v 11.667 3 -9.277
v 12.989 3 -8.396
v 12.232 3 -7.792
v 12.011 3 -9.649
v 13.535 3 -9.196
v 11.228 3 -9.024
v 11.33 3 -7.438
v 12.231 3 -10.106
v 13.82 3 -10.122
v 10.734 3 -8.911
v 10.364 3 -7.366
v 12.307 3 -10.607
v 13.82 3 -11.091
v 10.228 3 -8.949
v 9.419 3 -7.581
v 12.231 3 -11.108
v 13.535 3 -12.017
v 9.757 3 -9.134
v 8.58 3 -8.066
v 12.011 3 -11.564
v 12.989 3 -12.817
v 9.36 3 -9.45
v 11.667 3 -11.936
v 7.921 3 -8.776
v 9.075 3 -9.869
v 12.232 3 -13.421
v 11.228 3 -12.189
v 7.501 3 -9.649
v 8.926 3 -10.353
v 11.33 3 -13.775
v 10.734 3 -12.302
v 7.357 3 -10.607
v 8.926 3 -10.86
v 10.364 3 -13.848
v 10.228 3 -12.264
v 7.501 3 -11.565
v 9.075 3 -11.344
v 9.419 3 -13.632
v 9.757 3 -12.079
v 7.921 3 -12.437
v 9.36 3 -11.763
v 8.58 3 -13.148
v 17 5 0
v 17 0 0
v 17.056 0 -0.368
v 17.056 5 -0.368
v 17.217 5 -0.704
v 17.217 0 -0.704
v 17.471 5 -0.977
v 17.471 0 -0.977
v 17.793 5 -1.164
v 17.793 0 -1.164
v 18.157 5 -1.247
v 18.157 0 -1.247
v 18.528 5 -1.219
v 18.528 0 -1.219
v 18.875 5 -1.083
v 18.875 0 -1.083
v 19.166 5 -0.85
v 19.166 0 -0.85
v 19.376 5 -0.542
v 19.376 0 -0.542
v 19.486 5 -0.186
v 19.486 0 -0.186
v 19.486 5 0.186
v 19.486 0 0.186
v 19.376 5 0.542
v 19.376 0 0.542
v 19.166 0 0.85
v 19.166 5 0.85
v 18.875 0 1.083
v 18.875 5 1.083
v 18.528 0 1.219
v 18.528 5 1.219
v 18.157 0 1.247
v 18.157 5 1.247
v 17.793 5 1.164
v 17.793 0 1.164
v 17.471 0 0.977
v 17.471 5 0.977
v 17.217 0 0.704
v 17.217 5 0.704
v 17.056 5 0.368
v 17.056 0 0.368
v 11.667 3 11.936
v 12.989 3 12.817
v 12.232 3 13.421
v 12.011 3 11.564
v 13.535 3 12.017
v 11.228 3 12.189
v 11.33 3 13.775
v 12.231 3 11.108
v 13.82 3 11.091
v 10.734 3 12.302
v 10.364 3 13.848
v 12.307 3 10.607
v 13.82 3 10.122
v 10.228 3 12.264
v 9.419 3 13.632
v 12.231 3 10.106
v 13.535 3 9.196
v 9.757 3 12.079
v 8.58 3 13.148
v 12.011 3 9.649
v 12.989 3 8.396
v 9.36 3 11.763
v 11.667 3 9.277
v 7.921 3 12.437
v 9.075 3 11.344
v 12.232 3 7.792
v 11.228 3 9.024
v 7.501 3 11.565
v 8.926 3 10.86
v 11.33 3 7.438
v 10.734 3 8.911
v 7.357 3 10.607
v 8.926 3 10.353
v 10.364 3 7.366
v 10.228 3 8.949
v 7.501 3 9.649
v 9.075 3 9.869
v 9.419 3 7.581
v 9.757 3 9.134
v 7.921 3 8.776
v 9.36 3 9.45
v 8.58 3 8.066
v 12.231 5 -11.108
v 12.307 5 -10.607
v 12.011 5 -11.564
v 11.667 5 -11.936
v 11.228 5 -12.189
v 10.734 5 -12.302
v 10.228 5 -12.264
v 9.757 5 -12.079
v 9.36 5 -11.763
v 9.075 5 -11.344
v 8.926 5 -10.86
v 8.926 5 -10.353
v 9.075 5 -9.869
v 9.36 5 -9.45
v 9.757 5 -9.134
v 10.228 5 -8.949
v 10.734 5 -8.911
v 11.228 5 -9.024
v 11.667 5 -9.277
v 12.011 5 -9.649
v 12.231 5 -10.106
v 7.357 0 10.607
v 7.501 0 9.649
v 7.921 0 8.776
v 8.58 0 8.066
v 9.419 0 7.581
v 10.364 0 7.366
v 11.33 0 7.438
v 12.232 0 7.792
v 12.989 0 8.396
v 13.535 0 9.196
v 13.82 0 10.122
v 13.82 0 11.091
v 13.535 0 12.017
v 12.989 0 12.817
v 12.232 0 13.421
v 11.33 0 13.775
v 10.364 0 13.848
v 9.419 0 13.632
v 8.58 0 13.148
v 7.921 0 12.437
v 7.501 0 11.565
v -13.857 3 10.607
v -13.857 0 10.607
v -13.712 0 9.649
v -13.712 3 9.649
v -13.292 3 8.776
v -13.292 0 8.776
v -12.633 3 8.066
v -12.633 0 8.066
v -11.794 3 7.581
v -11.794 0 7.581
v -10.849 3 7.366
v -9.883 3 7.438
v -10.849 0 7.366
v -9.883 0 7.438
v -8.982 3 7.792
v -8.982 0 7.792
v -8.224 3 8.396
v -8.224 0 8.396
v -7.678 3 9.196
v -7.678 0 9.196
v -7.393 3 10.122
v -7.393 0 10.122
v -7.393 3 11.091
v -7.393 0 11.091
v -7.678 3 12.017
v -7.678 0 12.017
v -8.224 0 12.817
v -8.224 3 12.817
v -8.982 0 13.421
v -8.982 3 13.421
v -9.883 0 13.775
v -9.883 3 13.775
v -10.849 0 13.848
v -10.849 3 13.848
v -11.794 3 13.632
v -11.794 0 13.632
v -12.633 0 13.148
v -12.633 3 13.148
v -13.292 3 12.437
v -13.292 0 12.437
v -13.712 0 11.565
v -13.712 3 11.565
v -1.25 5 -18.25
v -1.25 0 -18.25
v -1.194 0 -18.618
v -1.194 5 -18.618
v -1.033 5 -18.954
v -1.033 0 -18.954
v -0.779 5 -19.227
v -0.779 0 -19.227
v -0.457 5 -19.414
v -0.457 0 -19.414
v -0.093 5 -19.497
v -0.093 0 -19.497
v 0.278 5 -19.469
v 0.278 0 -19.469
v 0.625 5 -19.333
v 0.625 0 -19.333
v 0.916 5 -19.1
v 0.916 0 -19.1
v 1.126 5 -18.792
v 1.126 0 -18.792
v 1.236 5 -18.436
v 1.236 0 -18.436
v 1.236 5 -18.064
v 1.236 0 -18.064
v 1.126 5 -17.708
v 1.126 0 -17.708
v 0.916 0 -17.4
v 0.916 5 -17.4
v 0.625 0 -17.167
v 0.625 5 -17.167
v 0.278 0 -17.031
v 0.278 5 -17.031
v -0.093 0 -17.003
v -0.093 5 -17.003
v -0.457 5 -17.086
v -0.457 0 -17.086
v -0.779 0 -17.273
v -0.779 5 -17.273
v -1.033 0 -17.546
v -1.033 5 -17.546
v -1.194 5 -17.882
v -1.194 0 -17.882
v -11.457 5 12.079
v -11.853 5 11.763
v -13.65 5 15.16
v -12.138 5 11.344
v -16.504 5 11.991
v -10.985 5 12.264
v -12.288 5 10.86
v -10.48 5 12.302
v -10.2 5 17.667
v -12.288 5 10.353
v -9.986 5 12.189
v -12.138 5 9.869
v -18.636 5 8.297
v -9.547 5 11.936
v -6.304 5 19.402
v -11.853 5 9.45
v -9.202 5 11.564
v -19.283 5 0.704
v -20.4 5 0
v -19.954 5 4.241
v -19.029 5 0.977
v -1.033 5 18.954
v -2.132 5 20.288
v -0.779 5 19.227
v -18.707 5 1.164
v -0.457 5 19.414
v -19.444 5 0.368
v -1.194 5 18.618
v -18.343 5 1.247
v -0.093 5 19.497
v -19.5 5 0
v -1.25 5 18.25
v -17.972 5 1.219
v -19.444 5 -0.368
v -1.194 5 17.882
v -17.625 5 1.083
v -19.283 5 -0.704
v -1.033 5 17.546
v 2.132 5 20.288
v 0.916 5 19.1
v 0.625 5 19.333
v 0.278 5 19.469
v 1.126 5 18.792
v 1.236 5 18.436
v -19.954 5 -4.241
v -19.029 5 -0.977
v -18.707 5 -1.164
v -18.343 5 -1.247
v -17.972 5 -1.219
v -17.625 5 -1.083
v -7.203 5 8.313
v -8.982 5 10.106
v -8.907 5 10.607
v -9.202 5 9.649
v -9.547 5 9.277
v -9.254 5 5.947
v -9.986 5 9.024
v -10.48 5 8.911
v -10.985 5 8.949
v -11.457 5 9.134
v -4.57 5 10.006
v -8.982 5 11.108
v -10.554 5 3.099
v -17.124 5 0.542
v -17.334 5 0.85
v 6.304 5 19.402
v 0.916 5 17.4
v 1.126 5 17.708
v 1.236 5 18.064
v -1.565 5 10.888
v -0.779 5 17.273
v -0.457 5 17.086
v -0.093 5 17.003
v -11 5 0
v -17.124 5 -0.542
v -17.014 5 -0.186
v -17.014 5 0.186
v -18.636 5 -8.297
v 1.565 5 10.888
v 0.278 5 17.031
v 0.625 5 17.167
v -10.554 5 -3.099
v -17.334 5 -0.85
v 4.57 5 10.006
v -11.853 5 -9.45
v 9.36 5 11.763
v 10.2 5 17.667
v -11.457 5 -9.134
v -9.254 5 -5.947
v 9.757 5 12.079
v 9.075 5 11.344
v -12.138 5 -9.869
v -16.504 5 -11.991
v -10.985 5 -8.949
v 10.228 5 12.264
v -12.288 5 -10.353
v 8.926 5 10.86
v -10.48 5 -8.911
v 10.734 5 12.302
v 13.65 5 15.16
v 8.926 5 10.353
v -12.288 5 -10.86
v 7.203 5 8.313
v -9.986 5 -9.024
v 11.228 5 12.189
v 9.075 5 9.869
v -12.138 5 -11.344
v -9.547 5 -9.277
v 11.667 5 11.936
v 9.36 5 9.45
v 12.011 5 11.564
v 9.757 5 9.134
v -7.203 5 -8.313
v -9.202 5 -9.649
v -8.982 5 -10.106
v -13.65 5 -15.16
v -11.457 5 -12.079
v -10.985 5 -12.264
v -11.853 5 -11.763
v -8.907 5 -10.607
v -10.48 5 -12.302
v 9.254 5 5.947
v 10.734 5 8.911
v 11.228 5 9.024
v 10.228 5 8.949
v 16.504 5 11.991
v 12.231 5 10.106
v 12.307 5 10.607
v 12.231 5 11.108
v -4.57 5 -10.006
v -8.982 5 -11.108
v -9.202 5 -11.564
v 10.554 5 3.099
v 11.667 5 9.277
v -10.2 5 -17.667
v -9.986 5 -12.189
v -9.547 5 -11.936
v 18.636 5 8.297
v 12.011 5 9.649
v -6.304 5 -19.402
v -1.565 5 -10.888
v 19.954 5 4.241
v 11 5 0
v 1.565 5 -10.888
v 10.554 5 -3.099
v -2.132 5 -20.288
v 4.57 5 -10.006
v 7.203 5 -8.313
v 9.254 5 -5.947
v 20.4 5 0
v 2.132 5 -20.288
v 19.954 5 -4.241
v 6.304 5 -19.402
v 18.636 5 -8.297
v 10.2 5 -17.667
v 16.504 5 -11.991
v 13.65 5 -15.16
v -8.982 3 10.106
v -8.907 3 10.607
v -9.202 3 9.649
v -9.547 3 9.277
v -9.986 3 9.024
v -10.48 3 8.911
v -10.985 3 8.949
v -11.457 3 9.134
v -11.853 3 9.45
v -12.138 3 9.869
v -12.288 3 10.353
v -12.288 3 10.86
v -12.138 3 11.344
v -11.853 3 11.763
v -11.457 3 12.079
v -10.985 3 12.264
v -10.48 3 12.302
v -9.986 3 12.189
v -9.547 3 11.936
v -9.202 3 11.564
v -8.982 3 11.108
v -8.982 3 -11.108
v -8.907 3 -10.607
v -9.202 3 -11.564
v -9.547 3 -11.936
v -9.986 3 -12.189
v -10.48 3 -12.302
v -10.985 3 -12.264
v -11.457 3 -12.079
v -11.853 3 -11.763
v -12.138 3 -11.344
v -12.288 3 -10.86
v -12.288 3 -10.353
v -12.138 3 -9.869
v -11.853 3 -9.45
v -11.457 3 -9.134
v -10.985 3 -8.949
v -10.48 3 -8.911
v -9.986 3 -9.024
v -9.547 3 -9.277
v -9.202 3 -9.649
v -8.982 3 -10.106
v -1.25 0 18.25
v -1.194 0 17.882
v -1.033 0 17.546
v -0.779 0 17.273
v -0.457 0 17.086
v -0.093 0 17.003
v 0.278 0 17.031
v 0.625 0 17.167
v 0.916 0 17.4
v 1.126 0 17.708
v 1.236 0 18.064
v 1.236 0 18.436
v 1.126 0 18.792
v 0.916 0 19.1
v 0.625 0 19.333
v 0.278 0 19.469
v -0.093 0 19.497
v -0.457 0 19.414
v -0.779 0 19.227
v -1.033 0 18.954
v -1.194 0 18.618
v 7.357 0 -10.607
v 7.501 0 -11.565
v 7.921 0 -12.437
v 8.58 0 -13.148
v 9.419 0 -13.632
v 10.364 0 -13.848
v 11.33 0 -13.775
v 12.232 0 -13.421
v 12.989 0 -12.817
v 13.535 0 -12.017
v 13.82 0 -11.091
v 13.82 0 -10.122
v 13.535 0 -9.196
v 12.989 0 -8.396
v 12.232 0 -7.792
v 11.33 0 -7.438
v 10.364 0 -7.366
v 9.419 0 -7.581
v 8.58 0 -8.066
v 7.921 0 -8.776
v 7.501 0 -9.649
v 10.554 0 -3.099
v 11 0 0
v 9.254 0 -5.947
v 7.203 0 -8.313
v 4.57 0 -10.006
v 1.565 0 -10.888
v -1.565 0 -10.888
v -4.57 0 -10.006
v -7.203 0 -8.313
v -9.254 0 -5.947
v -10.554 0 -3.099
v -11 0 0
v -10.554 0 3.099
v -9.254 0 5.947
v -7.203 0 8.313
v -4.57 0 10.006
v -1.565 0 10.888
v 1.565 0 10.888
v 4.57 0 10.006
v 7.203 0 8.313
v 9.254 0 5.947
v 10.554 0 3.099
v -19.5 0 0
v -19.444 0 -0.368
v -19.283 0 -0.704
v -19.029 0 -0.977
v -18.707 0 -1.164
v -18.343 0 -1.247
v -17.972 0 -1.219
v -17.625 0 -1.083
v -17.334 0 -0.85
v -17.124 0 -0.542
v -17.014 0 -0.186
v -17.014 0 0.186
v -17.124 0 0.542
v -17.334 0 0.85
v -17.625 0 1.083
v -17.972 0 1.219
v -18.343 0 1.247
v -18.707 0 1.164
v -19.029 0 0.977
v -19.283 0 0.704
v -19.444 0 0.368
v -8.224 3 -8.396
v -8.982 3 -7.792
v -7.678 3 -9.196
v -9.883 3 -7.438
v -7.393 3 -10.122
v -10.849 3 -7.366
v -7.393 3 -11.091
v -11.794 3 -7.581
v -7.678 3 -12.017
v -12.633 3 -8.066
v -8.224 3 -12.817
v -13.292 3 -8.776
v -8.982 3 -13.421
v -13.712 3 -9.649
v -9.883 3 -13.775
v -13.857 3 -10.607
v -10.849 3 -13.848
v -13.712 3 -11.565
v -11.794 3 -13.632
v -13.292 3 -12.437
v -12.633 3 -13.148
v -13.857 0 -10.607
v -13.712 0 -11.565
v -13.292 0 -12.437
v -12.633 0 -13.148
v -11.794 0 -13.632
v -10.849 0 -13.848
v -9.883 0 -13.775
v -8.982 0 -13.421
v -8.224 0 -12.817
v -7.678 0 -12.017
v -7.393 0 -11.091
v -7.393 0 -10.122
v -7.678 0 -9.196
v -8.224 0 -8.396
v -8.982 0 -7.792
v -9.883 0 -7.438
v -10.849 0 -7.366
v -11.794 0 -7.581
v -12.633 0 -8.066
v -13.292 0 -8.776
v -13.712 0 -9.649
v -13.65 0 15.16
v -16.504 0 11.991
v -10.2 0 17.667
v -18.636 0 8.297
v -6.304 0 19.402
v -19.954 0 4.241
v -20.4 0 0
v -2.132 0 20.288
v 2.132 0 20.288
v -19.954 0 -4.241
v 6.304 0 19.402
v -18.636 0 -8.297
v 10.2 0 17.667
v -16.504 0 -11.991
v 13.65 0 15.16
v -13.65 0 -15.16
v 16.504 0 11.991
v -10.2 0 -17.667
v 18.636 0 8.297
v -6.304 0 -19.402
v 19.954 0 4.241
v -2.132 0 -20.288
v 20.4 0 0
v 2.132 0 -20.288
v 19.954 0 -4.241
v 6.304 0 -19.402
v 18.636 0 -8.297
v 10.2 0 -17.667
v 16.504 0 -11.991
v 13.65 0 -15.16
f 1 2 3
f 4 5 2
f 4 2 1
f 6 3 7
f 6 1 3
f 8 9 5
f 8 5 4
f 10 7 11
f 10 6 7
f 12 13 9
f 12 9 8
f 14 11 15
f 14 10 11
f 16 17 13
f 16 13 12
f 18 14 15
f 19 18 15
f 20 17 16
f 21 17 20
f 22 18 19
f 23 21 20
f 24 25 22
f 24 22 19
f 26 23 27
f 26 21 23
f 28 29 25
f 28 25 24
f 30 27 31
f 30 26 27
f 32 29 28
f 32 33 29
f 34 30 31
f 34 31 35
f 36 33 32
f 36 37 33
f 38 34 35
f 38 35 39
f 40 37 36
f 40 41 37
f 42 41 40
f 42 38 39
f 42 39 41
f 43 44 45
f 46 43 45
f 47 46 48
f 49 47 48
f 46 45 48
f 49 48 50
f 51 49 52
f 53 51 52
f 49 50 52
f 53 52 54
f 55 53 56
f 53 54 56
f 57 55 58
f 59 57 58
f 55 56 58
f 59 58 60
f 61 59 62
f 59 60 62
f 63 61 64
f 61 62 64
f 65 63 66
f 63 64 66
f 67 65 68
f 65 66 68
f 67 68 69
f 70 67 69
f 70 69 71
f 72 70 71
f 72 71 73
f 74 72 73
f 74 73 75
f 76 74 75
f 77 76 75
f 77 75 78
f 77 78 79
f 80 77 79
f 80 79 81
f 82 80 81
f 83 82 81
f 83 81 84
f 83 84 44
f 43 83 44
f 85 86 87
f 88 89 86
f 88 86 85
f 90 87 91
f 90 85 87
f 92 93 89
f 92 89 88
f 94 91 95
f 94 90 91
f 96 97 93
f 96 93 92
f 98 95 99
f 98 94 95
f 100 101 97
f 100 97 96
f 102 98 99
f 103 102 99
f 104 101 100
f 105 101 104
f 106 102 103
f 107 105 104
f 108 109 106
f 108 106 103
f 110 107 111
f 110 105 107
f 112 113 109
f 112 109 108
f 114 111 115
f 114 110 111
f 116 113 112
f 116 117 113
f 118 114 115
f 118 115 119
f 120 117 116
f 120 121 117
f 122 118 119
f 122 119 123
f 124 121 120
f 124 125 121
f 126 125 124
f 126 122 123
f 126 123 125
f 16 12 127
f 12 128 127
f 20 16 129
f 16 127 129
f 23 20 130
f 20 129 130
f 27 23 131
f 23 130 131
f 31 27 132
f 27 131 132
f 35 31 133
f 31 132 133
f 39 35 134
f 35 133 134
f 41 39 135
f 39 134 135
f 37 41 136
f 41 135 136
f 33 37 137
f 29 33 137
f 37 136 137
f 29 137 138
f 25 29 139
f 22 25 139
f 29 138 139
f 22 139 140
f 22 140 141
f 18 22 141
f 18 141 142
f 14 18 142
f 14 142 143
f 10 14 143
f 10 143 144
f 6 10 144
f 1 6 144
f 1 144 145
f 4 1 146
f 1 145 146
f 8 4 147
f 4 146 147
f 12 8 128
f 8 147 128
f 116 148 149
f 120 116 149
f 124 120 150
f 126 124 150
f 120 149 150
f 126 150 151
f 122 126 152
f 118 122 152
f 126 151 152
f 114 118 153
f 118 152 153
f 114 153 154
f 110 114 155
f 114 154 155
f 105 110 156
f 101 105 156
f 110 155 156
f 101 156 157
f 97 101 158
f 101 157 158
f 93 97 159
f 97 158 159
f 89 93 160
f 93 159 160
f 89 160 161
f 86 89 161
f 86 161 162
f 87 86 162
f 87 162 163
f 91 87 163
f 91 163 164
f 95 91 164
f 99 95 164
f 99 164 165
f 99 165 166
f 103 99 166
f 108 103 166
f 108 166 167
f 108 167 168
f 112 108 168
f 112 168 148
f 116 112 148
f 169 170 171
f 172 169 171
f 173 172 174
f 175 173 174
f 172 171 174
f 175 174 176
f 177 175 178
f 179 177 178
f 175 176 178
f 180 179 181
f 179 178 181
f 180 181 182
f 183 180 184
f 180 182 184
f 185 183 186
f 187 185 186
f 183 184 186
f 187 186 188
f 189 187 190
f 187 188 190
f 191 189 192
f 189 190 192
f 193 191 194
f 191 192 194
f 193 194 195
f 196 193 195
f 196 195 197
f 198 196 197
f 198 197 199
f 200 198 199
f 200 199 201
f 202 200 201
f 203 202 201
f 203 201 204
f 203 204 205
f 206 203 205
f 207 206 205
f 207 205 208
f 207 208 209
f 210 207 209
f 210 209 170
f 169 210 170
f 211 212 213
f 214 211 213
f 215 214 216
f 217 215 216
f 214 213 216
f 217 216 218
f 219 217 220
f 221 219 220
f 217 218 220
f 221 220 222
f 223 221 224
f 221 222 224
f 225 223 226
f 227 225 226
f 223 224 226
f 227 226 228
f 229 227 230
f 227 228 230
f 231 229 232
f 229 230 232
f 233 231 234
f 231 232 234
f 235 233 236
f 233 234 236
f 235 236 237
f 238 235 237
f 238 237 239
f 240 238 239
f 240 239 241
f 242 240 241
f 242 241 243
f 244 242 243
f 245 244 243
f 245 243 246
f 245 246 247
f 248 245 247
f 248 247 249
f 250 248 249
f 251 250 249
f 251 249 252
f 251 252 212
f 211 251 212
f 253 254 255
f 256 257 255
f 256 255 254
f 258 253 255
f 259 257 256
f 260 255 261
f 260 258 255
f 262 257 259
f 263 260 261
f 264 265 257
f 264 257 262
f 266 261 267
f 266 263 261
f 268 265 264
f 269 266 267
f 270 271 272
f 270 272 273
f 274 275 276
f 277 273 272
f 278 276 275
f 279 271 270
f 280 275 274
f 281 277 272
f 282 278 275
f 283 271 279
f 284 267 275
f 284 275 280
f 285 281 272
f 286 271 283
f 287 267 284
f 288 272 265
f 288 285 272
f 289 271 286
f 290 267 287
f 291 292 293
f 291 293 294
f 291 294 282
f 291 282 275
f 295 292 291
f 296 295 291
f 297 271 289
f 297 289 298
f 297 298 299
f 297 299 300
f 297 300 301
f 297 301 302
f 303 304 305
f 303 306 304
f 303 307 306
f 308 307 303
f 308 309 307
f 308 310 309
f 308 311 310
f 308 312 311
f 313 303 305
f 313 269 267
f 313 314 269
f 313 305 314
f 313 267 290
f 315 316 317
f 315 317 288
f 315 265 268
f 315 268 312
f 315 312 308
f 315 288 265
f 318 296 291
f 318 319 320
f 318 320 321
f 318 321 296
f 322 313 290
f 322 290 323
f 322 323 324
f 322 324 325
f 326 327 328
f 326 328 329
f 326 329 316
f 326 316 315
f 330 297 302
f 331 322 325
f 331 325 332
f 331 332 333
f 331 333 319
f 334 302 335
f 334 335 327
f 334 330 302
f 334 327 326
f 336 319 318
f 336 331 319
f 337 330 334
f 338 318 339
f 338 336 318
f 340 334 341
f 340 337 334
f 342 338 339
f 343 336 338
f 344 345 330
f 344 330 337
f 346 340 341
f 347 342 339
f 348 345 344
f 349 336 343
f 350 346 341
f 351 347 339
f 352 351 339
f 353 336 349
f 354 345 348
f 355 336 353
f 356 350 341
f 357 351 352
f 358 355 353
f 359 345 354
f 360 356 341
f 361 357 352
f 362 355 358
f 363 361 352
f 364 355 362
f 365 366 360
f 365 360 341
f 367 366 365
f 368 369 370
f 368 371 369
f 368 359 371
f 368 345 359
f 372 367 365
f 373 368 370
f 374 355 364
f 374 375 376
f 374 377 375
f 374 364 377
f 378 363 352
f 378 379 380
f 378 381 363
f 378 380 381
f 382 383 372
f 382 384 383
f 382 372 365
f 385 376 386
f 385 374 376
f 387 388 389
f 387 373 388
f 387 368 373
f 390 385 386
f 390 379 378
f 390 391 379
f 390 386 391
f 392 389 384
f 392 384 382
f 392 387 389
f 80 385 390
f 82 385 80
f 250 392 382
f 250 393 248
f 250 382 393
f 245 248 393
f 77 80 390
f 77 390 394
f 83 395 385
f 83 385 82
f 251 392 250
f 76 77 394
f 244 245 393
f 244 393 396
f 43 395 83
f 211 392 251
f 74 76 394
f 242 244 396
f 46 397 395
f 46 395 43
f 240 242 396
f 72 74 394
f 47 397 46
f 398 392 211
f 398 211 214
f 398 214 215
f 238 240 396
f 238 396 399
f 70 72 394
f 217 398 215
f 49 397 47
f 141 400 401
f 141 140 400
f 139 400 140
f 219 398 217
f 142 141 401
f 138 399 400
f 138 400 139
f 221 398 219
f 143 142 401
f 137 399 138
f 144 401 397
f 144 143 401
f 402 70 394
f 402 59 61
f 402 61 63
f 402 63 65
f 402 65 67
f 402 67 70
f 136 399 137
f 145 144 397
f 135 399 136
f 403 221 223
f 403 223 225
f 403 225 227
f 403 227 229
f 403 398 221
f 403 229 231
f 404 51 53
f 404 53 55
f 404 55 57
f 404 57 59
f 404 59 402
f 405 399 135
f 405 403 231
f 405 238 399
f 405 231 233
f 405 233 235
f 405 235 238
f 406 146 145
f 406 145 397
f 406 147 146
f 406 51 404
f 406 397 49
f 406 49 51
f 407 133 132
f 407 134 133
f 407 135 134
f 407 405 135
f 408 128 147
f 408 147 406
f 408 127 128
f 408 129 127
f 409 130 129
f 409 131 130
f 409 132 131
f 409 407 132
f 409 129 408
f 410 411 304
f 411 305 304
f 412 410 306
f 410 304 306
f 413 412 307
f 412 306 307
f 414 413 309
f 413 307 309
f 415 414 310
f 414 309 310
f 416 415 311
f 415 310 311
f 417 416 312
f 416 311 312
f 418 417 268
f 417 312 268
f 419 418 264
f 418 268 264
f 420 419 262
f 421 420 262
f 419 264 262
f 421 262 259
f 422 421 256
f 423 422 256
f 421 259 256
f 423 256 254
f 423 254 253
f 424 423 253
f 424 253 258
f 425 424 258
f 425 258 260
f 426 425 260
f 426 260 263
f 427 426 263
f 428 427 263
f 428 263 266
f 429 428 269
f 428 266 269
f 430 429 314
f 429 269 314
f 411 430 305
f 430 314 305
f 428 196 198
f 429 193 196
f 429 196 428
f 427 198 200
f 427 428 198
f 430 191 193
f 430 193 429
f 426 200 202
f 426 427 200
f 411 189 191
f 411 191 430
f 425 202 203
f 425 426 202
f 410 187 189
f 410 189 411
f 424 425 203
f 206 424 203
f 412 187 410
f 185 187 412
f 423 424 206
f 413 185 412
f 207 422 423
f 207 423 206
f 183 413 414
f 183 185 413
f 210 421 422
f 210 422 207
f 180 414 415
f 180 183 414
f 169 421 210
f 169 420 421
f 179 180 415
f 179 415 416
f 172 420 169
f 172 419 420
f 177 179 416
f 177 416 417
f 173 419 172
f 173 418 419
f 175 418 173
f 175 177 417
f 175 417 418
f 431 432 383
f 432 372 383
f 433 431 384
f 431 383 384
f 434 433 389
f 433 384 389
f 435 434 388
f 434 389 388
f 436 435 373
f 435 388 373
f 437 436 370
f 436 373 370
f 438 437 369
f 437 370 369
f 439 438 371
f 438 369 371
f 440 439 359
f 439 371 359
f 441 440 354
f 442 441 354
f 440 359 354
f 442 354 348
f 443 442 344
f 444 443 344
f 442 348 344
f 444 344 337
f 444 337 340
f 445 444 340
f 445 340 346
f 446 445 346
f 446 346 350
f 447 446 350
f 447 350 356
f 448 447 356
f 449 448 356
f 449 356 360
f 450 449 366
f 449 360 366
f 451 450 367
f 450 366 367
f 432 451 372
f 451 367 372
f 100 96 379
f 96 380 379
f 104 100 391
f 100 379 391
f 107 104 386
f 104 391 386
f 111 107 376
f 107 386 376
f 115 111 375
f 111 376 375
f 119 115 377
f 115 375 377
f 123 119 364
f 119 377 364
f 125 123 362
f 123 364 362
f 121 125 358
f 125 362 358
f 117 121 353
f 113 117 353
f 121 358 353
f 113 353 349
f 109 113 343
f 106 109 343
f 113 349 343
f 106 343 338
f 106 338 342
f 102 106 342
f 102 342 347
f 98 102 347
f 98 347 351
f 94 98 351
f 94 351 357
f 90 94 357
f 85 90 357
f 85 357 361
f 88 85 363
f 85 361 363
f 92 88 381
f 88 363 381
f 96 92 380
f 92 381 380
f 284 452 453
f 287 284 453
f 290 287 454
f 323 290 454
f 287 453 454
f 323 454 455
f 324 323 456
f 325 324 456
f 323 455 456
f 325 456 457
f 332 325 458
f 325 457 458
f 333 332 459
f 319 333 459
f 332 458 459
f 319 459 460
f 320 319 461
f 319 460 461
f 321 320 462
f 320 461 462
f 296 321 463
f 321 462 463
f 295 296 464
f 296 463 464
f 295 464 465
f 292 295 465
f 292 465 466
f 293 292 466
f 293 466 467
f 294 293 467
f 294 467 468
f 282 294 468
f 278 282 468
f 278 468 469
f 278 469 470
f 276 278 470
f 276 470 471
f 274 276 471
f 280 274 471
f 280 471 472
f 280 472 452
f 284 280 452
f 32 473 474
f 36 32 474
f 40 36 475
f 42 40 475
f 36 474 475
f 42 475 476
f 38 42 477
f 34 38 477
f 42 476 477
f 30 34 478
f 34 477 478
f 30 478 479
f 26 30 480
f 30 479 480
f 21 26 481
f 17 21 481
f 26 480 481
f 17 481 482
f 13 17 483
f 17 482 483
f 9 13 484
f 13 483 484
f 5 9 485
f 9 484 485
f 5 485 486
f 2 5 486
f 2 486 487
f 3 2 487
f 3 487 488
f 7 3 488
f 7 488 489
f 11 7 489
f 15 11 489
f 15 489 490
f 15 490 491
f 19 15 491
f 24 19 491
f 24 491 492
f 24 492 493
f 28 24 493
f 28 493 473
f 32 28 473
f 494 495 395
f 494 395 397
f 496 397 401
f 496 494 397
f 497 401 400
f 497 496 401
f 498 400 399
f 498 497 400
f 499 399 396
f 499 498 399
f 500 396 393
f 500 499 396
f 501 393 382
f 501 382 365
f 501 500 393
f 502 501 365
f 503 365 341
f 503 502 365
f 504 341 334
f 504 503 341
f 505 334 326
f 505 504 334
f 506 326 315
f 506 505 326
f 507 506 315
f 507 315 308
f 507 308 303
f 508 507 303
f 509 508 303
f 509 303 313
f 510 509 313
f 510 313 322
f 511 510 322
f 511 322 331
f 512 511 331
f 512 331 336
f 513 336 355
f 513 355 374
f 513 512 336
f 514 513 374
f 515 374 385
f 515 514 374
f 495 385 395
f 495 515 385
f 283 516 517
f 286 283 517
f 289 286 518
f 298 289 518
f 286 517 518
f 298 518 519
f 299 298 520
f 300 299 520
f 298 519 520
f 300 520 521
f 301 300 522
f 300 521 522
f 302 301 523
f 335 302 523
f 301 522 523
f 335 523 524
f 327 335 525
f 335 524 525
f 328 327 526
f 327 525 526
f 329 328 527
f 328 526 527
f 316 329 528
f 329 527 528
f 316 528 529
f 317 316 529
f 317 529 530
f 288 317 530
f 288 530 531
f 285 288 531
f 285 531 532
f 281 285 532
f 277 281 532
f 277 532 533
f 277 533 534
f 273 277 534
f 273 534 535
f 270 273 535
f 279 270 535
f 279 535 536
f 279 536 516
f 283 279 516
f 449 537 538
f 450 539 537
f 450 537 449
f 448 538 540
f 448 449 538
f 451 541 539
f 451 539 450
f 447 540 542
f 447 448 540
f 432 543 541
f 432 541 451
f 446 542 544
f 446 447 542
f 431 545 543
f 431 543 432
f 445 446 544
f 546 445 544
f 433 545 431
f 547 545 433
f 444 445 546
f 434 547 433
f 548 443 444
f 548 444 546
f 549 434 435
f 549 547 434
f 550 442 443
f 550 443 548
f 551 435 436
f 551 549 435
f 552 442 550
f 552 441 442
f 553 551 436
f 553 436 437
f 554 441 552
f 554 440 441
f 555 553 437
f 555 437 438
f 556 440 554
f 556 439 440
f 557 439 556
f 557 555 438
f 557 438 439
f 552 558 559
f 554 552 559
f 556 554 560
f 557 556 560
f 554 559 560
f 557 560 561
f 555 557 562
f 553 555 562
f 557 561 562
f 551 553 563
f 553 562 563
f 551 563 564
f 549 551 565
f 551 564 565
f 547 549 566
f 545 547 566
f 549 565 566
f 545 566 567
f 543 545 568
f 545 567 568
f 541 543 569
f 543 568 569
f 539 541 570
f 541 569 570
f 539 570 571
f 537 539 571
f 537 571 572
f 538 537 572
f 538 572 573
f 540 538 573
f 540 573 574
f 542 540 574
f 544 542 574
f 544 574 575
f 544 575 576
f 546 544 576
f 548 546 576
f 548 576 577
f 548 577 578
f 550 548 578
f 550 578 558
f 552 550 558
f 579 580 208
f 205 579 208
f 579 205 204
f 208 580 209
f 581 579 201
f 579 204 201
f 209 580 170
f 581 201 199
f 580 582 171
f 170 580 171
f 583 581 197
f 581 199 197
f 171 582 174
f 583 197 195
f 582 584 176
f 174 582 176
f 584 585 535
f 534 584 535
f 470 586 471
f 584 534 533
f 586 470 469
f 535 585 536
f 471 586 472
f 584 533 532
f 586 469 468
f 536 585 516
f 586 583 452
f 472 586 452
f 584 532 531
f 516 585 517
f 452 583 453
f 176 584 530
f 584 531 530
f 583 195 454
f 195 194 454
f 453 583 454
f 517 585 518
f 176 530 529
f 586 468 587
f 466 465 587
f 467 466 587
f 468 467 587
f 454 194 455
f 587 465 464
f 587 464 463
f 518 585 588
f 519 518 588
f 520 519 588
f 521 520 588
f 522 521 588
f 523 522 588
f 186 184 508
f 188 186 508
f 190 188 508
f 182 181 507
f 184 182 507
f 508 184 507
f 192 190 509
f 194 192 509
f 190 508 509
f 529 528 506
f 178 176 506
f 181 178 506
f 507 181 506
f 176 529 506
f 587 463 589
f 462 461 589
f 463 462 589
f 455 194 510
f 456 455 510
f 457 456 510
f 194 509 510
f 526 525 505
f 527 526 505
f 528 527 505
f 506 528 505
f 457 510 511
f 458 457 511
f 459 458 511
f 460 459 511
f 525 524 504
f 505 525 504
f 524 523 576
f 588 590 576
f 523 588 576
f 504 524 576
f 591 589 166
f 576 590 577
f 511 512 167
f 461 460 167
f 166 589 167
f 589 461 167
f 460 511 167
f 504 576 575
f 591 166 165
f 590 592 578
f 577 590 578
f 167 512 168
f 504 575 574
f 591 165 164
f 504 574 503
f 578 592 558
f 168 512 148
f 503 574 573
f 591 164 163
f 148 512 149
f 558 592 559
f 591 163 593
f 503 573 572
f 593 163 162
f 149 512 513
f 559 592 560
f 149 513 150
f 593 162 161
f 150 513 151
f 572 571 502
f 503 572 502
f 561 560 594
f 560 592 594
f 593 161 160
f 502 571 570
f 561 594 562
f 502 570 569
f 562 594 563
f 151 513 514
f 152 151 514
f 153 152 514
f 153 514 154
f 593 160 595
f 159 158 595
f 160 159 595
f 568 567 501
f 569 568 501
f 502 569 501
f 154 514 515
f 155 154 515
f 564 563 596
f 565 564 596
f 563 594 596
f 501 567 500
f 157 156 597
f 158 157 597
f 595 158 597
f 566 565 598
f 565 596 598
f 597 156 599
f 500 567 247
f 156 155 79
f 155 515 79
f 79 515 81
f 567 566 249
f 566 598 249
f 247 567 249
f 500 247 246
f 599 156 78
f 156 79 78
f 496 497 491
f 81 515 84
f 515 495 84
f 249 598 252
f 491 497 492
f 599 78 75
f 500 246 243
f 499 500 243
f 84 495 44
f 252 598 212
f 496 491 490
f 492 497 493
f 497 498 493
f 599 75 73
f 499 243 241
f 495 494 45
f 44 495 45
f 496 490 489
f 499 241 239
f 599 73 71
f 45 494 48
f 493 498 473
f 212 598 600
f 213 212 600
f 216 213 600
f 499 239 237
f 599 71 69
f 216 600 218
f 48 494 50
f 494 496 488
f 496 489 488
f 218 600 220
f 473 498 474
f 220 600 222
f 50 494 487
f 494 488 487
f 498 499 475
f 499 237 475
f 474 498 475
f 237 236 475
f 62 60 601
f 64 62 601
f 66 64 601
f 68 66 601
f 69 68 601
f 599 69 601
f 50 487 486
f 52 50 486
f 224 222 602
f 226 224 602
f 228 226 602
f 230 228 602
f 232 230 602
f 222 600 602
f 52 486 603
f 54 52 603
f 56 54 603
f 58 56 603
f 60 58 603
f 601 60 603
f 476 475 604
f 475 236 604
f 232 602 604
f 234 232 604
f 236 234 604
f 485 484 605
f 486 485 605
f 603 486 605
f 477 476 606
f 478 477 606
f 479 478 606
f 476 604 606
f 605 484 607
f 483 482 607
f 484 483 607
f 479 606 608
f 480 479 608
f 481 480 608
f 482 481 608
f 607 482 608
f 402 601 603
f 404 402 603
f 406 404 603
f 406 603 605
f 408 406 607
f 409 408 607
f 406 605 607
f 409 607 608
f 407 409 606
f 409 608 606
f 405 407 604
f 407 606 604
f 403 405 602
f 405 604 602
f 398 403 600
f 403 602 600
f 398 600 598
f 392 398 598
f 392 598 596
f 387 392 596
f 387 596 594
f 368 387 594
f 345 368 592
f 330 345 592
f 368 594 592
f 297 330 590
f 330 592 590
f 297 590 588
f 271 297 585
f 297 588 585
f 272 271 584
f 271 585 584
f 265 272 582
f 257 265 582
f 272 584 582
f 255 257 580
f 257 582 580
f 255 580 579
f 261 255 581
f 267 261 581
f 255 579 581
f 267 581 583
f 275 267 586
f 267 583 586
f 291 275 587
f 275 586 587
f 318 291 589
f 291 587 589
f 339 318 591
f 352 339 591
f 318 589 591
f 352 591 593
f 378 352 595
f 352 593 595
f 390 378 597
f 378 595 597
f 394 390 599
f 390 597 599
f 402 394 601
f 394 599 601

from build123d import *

# Parameters (mm, degrees)
SKETCH_1_R                  = 20.4
SKETCH_1_R_2                = 11
EXTRUDE_1_DEPTH             = 5
M3X0_51_D                   = 2.5
HOLE_WIZARD_M31_D           = 3.4
HOLE_WIZARD_M31_CBORE_D     = 6.5
HOLE_WIZARD_M31_CBORE_DEPTH = 3


with BuildPart() as part:
    # Эскиз1 → Бобышка-Вытянуть1 (new body)
    with BuildSketch(Plane(origin=(0, 0, 0), x_dir=(1, 0, 0), z_dir=(0, 1, 0))):
        Circle(SKETCH_1_R)
        Circle(SKETCH_1_R_2, mode=Mode.SUBTRACT)
    extrude(amount=EXTRUDE_1_DEPTH)

    # Отверстие обработанное метчиком M3x0.51 (through all)
    with Locations(Plane(origin=(0, 5, 0), x_dir=(1, 0, 0), z_dir=(0, 1, 0))):
        with Locations((-18.25, 0), (0, 18.25), (18.25, 0), (0, -18.25)):
            Hole(M3X0_51_D / 2)

    # Цековка для винта с внутренним шестигранником M31 (through all)
    with Locations(Plane(origin=(0, 0, 0), x_dir=(-1, 0, 0), z_dir=(0, -1, 0))):
        with Locations((10.606601718, -10.606601718), (-10.606601718, -10.606601718), (-10.606601718, 10.606601718), (10.606601718, 10.606601718)):
            CounterBoreHole(HOLE_WIZARD_M31_D / 2, HOLE_WIZARD_M31_CBORE_D / 2, HOLE_WIZARD_M31_CBORE_DEPTH)


solid = part.part
